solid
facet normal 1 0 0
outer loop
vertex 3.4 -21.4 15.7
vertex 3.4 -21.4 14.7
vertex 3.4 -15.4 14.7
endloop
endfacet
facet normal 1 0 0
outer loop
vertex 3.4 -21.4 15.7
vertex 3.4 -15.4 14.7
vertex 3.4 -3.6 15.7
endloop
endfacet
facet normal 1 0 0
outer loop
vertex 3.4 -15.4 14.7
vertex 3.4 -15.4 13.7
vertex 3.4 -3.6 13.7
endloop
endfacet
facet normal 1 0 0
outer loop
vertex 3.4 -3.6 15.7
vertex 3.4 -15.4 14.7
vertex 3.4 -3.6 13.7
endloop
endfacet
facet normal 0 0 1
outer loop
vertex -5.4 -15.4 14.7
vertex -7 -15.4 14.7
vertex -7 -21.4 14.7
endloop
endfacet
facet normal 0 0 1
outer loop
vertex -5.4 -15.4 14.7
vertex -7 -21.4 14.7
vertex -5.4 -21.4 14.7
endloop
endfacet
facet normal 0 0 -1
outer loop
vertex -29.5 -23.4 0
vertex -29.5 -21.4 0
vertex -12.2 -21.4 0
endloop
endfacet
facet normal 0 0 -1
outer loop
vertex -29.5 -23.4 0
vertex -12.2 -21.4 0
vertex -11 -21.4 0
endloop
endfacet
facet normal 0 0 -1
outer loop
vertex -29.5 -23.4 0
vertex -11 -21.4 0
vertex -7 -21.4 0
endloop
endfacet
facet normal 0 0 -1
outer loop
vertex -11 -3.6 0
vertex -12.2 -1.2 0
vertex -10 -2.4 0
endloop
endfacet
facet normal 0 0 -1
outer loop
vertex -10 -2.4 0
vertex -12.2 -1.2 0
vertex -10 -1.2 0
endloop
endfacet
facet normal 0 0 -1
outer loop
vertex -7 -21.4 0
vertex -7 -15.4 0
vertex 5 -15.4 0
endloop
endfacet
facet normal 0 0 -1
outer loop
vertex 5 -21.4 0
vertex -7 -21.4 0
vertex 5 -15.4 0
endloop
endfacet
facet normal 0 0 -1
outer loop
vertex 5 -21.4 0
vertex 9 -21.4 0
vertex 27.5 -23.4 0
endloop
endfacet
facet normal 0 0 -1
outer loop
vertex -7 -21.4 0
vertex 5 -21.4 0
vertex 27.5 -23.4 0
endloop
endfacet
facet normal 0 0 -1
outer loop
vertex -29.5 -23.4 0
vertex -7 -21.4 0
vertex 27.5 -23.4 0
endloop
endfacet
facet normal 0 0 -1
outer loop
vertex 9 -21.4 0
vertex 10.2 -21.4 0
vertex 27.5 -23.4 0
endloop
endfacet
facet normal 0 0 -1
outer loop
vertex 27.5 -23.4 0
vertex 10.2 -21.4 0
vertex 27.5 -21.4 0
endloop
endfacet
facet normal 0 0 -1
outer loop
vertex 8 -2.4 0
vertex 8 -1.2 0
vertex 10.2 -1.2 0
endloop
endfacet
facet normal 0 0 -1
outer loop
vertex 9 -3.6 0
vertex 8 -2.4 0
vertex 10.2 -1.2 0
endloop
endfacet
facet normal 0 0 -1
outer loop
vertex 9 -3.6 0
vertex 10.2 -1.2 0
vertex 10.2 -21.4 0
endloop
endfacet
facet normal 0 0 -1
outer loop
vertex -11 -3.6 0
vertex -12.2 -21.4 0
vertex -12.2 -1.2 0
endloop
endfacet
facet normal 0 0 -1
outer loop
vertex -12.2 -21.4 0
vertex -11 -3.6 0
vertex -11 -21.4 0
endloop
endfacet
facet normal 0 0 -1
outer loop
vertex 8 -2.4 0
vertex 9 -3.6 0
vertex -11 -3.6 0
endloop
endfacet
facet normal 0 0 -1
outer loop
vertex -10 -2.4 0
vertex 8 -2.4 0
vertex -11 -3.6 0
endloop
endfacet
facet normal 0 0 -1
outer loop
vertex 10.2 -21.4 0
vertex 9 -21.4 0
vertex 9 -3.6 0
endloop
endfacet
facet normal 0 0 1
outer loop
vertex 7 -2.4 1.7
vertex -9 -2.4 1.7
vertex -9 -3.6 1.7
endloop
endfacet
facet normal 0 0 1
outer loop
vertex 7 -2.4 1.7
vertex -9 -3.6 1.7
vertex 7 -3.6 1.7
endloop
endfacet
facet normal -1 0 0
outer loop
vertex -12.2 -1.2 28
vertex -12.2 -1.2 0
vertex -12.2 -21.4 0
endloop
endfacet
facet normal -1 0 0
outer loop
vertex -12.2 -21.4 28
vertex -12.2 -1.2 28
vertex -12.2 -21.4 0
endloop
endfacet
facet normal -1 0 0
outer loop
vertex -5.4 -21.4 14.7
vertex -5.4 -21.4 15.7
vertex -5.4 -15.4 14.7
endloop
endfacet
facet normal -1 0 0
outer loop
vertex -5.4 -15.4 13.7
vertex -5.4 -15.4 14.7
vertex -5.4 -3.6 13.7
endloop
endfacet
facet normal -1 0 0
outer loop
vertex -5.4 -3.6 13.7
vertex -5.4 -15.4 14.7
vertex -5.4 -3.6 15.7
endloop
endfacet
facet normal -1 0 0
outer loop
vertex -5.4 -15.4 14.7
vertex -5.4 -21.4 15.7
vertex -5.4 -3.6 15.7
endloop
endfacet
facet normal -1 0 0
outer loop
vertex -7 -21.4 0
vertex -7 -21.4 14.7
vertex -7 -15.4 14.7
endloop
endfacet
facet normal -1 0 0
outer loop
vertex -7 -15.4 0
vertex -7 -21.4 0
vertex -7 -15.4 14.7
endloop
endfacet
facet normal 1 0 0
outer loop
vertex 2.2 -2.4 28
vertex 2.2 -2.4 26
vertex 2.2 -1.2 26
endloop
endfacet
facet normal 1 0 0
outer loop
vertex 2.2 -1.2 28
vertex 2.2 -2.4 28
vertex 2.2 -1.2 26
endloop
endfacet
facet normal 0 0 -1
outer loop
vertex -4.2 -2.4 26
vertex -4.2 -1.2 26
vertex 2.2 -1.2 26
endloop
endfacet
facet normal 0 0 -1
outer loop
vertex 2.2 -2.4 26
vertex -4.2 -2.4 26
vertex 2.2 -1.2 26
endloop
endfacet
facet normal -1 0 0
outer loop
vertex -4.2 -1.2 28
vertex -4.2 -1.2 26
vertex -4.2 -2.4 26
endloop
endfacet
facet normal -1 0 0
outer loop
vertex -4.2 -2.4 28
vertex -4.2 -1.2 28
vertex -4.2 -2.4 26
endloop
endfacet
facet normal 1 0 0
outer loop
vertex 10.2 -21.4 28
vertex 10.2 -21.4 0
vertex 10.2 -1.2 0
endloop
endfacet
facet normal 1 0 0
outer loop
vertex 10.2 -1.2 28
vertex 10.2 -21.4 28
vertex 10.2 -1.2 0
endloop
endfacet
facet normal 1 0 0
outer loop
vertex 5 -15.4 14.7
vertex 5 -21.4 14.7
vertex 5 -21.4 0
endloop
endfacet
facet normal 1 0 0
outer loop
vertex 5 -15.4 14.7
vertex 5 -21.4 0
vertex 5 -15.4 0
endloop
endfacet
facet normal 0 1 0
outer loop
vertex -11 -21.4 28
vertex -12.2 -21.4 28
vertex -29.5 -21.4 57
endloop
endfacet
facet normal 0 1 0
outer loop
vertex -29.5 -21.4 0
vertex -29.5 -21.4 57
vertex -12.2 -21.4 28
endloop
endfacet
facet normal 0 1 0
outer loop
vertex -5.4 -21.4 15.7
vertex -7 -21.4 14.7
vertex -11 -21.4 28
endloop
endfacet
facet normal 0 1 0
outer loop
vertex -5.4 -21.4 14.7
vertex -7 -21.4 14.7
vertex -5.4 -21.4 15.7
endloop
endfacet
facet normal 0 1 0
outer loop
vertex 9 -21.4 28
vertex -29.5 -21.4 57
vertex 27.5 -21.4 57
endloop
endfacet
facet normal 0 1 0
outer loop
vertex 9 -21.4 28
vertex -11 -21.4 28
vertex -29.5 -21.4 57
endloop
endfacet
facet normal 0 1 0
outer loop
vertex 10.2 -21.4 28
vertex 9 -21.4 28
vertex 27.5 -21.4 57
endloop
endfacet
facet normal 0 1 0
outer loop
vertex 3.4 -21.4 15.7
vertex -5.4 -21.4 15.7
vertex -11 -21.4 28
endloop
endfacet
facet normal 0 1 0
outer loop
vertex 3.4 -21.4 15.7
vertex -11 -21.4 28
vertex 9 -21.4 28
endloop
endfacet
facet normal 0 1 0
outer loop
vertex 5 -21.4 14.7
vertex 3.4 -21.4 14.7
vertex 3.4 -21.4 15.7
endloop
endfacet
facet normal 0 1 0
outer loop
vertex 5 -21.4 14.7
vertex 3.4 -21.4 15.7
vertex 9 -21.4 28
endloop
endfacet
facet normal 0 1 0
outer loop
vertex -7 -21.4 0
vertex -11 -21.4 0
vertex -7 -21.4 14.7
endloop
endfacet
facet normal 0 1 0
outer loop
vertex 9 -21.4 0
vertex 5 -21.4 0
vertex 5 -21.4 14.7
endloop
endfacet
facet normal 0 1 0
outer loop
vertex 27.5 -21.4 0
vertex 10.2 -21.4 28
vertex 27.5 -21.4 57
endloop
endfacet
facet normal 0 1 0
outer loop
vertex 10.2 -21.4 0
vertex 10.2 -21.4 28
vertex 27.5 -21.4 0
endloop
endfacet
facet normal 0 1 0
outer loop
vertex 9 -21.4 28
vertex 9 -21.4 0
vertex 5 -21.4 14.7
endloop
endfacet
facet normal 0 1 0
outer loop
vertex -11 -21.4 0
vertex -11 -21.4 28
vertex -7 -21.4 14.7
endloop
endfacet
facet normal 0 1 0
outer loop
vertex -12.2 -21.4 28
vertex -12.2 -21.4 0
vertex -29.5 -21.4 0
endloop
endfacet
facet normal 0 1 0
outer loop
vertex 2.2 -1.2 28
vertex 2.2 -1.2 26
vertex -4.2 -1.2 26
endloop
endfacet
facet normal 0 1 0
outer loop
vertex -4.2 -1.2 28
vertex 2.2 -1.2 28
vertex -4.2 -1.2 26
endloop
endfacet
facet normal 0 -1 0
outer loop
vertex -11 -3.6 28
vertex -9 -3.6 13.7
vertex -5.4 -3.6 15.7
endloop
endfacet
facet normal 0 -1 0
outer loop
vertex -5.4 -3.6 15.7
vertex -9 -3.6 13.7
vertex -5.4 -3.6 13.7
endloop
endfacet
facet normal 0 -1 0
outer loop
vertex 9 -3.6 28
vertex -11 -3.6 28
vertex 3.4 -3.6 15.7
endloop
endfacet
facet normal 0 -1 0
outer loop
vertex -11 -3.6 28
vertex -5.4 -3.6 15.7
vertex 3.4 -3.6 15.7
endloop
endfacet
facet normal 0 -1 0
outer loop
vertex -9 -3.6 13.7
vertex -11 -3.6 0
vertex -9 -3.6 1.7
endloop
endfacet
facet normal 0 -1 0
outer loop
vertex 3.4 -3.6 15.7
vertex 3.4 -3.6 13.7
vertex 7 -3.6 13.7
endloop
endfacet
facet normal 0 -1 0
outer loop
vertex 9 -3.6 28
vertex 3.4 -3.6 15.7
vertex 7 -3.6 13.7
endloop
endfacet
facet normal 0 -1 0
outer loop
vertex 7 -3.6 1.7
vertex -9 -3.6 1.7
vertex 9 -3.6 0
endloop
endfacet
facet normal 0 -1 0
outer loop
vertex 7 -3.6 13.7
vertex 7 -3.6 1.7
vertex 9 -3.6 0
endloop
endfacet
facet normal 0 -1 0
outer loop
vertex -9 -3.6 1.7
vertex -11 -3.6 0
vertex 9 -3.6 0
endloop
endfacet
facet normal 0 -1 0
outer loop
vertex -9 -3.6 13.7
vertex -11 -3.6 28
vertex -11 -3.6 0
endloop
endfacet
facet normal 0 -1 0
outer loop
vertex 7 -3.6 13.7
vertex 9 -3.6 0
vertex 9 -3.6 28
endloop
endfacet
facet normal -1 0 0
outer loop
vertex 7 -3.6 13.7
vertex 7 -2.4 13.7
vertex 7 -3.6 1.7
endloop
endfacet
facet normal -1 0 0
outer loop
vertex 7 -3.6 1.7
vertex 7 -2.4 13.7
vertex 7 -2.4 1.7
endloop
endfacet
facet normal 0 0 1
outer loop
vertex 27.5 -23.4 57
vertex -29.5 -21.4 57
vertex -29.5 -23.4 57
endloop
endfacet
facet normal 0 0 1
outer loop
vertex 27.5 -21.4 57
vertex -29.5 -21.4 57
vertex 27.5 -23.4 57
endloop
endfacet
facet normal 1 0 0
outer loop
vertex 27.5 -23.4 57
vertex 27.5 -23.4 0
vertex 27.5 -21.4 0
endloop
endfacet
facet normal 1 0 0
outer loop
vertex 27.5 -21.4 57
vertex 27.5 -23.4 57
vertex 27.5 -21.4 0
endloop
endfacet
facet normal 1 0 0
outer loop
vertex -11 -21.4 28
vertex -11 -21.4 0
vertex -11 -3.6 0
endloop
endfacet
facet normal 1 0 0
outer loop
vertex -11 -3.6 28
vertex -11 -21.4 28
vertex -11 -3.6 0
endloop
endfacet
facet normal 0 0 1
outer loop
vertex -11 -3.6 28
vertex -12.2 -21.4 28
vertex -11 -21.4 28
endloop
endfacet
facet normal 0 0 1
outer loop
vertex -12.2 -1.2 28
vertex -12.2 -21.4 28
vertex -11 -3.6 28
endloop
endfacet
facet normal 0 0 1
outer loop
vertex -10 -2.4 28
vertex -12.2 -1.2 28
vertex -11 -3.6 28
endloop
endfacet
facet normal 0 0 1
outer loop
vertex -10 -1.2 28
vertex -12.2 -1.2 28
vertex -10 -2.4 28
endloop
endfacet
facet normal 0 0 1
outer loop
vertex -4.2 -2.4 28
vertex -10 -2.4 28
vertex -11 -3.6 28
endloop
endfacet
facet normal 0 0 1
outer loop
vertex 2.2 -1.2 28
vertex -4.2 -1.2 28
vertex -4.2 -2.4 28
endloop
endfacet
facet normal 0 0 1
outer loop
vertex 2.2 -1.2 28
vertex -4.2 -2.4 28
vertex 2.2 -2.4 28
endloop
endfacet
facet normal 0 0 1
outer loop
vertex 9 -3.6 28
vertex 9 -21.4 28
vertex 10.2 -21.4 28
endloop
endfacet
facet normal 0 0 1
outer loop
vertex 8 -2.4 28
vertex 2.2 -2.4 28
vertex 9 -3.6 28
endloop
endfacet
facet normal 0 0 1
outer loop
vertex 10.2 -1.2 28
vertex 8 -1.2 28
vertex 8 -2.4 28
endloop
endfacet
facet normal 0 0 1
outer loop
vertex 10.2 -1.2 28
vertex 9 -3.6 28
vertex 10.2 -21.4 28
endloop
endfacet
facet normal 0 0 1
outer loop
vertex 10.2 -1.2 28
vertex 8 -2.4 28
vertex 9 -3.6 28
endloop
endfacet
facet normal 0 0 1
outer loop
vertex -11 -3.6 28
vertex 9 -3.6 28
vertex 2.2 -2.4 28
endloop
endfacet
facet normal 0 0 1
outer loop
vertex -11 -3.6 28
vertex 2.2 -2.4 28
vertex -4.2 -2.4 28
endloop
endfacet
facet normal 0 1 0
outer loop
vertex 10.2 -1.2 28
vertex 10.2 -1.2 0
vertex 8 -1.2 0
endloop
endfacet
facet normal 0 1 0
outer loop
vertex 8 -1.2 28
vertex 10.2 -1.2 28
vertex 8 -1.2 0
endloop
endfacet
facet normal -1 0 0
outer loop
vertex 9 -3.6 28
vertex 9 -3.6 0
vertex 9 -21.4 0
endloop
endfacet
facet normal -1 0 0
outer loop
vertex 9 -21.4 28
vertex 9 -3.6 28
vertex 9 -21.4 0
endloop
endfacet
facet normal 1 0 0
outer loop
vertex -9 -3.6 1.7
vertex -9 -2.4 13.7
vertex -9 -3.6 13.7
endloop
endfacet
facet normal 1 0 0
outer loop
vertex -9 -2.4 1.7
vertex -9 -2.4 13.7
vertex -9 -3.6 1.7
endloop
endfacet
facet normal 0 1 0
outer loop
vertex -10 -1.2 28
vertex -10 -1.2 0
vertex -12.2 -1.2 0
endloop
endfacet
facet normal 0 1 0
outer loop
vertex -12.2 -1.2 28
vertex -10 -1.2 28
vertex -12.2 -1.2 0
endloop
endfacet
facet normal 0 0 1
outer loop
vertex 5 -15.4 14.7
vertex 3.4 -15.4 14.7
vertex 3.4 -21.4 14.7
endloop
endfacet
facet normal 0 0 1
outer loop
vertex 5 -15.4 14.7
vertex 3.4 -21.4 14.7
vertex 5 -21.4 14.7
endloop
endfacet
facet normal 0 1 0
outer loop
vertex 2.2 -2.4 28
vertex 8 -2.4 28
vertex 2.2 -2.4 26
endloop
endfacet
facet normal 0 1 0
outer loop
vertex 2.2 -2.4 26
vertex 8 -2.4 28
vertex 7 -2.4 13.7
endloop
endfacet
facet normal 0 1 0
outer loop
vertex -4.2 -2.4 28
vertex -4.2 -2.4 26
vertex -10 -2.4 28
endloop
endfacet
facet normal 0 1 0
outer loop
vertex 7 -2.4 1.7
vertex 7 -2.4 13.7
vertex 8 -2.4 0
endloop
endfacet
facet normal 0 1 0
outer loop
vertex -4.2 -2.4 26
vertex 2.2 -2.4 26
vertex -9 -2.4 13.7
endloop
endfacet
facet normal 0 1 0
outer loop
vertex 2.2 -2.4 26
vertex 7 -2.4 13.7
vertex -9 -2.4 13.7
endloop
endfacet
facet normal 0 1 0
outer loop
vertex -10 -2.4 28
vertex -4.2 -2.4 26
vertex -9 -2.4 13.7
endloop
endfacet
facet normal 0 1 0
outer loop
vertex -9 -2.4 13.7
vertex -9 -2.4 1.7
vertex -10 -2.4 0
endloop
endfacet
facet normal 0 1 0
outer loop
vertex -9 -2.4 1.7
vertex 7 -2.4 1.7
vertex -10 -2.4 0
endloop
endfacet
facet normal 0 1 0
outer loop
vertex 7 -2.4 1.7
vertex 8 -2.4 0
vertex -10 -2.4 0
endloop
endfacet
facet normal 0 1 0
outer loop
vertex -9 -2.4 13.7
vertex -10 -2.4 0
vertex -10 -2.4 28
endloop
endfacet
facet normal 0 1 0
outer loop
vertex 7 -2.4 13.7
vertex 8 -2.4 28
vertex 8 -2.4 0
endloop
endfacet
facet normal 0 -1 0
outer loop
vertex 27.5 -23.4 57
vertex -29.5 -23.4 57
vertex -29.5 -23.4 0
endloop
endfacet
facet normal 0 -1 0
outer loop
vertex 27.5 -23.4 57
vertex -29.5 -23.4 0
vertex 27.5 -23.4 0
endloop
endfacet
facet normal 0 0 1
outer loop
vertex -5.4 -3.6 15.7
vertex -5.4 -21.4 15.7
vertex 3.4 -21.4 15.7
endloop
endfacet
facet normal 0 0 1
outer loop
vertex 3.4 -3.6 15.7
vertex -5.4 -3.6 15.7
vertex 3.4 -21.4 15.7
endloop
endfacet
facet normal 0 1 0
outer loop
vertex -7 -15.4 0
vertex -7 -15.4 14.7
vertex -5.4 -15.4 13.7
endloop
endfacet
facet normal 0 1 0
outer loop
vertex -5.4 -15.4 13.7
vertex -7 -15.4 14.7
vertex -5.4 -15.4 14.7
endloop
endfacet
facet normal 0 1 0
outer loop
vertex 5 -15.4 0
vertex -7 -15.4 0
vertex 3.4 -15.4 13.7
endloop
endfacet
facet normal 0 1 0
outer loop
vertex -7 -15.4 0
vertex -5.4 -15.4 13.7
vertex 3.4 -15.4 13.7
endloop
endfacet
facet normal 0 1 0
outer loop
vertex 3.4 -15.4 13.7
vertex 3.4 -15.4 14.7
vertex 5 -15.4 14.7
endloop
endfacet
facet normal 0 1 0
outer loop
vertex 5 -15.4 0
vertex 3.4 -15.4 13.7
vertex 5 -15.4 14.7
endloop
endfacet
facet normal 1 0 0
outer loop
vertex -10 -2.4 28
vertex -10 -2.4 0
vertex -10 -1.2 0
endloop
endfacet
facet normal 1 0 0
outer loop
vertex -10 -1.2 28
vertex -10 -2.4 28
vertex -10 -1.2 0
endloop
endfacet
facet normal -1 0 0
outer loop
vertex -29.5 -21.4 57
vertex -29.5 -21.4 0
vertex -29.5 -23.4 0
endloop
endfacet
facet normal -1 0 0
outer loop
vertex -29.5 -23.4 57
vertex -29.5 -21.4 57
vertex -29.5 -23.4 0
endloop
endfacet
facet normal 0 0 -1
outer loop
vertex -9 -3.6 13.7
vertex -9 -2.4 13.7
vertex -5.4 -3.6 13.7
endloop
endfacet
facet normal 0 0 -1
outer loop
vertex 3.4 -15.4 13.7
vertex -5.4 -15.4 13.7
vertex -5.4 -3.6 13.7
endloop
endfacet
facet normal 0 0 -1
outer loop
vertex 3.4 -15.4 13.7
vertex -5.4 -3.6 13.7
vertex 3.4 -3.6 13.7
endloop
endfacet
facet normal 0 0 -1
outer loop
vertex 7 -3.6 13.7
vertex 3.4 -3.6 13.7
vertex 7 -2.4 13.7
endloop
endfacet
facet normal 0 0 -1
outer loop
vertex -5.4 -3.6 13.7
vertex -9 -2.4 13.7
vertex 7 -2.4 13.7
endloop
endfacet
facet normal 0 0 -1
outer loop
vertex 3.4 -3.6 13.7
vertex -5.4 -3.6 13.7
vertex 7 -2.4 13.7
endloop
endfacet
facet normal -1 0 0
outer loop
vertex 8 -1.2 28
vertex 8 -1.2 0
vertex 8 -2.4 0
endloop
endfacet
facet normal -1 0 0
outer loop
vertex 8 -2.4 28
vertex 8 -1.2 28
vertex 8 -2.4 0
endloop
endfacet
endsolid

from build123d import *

# Parameters (mm, degrees)
BOSS_EXTRUDE2_DEPTH  = 28
SKETCH4_W            = 6.4
SKETCH4_H            = 26
CUT_EXTRUDE2_DEPTH   = 1.2
SKETCH5_W            = 16
SKETCH5_H            = 12
CUT_EXTRUDE3_DEPTH   = 1.2
SKETCH6_W            = 8.8
SKETCH6_H            = 17.8
BOSS_EXTRUDE3_DEPTH  = 2
SKETCH7_W            = 12
SKETCH7_H            = 6
BOSS_EXTRUDE4_DEPTH  = 15.7
SKETCH8_W            = 1.6
SKETCH8_H            = 6
CUT_EXTRUDE4_DEPTH   = 1
BOSS_EXTRUDE10_DEPTH = 57


with BuildPart() as part:
    # Sketch1 → Boss-Extrude2 (new body)
    with BuildSketch(Plane.XY):
        Polygon((9, -3.6), (9, -21.4), (10.2, -21.4), (10.2, -1.2), (8, -1.2), (8, -2.4), (2.2, -2.4), (2.2, -1.2), (-4.2, -1.2), (-4.2, -2.4), (-10, -2.4), (-10, -1.2), (-12.2, -1.2), (-12.2, -21.4), (-11, -21.4), (-11, -3.6), align=None)
    extrude(amount=BOSS_EXTRUDE2_DEPTH)

    # Sketch4 → Cut-Extrude2 (cut)
    with BuildSketch(Plane(origin=(0, -1.2, 0), x_dir=(1, 0, 0), z_dir=(0, 1, 0))):
        with Locations((-1, -13)):
            Rectangle(SKETCH4_W, SKETCH4_H)
    extrude(amount=-CUT_EXTRUDE2_DEPTH, mode=Mode.SUBTRACT)

    # Sketch5 → Cut-Extrude3 (cut)
    with BuildSketch(Plane(origin=(0, -2.4, 0), x_dir=(1, 0, 0), z_dir=(0, 1, 0))):
        with Locations((-1, -7.7)):
            Rectangle(SKETCH5_W, SKETCH5_H)
    extrude(amount=-CUT_EXTRUDE3_DEPTH, mode=Mode.SUBTRACT)

    # Sketch6 → Boss-Extrude3 (add)
    with BuildSketch(Plane(origin=(0, 0, 13.7), x_dir=(-1, 0, 0), z_dir=(0, 0, -1))):
        with Locations((1, -12.5)):
            Rectangle(SKETCH6_W, SKETCH6_H)
    extrude(amount=-BOSS_EXTRUDE3_DEPTH)

    # Sketch7 → Boss-Extrude4 (add)
    with BuildSketch(Plane.XY.offset(15.7)):
        with Locations((-1, -18.4)):
            Rectangle(SKETCH7_W, SKETCH7_H)
    extrude(amount=-BOSS_EXTRUDE4_DEPTH)

    # Sketch8 → Cut-Extrude4 (cut)
    with BuildSketch(Plane.XY.offset(15.7)):
        with Locations((-6.2, -18.4)):
            Rectangle(SKETCH8_W, SKETCH8_H)
        with Locations((4.2, -18.4)):
            Rectangle(SKETCH8_W, SKETCH8_H)
    extrude(amount=-CUT_EXTRUDE4_DEPTH, mode=Mode.SUBTRACT)

    # Sketch9 → Boss-Extrude10 (add)
    with BuildSketch(Plane(origin=(0, 0, 0), x_dir=(-1, 0, 0), z_dir=(0, 0, -1))):
        Polygon((1, -21.4), (29.5, -21.4), (29.5, -23.4), (-27.5, -23.4), (-27.5, -21.4), align=None)
    extrude(amount=-BOSS_EXTRUDE10_DEPTH)


solid = part.part
